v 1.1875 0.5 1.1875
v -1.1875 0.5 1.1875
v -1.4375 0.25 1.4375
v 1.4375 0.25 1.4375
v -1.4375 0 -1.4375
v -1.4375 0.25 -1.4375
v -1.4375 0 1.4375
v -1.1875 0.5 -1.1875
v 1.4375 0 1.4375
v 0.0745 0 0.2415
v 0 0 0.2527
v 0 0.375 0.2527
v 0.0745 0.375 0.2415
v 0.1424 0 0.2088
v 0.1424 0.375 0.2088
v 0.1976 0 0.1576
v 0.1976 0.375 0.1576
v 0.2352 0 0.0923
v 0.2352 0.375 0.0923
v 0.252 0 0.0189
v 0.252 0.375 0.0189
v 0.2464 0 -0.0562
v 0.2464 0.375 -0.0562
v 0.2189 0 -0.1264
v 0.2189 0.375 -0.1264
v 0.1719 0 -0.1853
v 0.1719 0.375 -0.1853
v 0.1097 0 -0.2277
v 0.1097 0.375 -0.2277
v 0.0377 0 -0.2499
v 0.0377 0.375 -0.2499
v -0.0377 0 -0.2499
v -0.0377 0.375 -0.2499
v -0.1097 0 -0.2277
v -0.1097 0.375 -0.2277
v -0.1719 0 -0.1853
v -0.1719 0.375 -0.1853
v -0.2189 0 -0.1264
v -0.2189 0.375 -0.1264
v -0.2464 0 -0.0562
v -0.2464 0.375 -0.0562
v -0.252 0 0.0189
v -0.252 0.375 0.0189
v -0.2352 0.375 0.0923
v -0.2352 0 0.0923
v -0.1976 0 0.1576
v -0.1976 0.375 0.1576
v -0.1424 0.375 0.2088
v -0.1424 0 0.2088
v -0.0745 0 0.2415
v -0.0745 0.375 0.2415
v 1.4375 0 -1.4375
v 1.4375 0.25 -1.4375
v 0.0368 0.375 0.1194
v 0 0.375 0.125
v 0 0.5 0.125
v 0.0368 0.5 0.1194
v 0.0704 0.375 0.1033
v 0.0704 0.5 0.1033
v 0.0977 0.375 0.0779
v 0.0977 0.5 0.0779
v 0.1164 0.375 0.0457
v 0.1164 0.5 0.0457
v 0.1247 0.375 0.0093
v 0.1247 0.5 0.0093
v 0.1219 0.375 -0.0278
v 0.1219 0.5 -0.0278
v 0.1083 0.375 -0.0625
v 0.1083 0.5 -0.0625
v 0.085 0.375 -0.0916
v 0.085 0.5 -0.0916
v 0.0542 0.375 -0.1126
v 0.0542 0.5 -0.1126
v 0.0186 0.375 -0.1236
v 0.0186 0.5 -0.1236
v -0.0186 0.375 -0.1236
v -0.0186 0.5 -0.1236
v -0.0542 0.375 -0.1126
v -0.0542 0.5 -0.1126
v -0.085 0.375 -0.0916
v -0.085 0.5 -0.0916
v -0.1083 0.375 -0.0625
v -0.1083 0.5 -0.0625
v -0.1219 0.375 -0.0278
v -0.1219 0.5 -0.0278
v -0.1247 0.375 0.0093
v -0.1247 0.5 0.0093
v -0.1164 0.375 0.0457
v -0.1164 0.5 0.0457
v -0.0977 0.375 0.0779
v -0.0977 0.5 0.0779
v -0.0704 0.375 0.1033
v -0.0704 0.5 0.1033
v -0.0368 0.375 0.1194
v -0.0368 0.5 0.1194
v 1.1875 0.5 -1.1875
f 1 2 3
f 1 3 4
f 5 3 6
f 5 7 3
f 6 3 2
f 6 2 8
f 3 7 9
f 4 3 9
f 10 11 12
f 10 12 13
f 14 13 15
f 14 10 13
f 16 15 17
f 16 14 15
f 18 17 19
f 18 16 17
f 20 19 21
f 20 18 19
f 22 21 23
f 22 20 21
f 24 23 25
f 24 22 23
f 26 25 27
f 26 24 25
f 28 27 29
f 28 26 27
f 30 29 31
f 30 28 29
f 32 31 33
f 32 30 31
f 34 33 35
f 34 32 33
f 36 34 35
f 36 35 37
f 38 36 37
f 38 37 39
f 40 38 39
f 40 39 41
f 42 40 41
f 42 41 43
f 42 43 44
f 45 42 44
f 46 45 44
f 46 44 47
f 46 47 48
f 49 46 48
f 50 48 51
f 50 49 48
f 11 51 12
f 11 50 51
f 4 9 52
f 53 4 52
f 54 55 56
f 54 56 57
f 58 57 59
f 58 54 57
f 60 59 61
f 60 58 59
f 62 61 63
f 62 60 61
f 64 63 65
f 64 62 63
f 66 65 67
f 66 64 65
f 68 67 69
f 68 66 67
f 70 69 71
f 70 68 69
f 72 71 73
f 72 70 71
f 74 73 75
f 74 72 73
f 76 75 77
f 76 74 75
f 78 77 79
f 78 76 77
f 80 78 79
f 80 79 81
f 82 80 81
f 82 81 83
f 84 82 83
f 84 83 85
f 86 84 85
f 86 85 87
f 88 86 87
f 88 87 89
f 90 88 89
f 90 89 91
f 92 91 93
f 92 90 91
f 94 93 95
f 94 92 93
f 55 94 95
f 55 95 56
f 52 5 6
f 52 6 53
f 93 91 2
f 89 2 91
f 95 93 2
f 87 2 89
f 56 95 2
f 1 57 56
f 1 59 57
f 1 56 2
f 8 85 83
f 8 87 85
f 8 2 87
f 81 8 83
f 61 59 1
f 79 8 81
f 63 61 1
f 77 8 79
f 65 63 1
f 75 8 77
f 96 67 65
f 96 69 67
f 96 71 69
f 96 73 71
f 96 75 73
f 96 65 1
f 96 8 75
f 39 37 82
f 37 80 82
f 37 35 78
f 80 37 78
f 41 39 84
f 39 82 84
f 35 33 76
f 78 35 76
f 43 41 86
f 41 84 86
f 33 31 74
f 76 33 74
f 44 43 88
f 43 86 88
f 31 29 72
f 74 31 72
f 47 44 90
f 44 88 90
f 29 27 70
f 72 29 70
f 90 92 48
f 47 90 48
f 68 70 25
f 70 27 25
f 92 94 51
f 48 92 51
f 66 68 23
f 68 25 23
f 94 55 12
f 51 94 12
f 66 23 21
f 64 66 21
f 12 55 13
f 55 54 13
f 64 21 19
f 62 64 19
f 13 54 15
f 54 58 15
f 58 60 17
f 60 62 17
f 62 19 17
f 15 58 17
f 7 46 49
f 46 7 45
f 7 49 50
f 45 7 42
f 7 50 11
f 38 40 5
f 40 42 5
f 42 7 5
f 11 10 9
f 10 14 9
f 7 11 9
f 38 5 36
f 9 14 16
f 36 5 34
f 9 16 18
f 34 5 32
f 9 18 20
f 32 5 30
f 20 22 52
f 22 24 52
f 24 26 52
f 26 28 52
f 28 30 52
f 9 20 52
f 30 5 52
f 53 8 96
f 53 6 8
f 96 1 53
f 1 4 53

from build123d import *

# Parameters (mm, degrees)
SKETCH1_W           = 2.875
SKETCH1_H           = 2.875
BOSS_EXTRUDE1_DEPTH = 0.5
SKETCH4_R           = 0.252718066
CUT_EXTRUDE2_DEPTH  = 0.375
SKETCH6_R           = 0.125
CUT_EXTRUDE3_DEPTH  = 0.125
CHAMFER1_SIZE       = 0.25
CHAMFER2_SIZE       = 0.25
CHAMFER3_SIZE       = 0.25
CHAMFER4_SIZE       = 0.25


with BuildPart() as part:
    # Sketch1 → Boss-Extrude1 (new body)
    with BuildSketch(Plane(origin=(0, 0, 0), x_dir=(1, 0, 0), z_dir=(0, 1, 0))):
        Rectangle(SKETCH1_W, SKETCH1_H)
    extrude(amount=BOSS_EXTRUDE1_DEPTH)

    # Sketch4 → Cut-Extrude2 (cut)
    with BuildSketch(Plane(origin=(0, 0, 0), x_dir=(1, 0, 0), z_dir=(0, 1, 0))):
        with Locations(Location((0, 0, 0), (0, 0, 270))):
            Circle(SKETCH4_R)
    extrude(amount=CUT_EXTRUDE2_DEPTH, mode=Mode.SUBTRACT)

    # Sketch6 → Cut-Extrude3 (cut)
    with BuildSketch(Plane(origin=(0, 0.375, 0), x_dir=(1, 0, 0), z_dir=(0, 1, 0))):
        with Locations(Location((0, 0, 0), (0, 0, 270))):
            Circle(SKETCH6_R)
    extrude(amount=CUT_EXTRUDE3_DEPTH, mode=Mode.SUBTRACT)

    # Chamfer1
    chamfer1_edges = [part.edges().sort_by_distance(p)[0] for p in [
        (0, 0.5, 1.4375),
    ]]
    chamfer(chamfer1_edges, length=CHAMFER1_SIZE)

    # Chamfer2
    chamfer2_edges = [part.edges().sort_by_distance(p)[0] for p in [
        (1.4375, 0.5, -0.125),
    ]]
    chamfer(chamfer2_edges, length=CHAMFER2_SIZE)

    # Chamfer3
    chamfer3_edges = [part.edges().sort_by_distance(p)[0] for p in [
        (-0.125, 0.5, -1.4375),
    ]]
    chamfer(chamfer3_edges, length=CHAMFER3_SIZE)

    # Chamfer4
    chamfer4_edges = [part.edges().sort_by_distance(p)[0] for p in [
        (-1.4375, 0.5, 0),
    ]]
    chamfer(chamfer4_edges, length=CHAMFER4_SIZE)


solid = part.part
